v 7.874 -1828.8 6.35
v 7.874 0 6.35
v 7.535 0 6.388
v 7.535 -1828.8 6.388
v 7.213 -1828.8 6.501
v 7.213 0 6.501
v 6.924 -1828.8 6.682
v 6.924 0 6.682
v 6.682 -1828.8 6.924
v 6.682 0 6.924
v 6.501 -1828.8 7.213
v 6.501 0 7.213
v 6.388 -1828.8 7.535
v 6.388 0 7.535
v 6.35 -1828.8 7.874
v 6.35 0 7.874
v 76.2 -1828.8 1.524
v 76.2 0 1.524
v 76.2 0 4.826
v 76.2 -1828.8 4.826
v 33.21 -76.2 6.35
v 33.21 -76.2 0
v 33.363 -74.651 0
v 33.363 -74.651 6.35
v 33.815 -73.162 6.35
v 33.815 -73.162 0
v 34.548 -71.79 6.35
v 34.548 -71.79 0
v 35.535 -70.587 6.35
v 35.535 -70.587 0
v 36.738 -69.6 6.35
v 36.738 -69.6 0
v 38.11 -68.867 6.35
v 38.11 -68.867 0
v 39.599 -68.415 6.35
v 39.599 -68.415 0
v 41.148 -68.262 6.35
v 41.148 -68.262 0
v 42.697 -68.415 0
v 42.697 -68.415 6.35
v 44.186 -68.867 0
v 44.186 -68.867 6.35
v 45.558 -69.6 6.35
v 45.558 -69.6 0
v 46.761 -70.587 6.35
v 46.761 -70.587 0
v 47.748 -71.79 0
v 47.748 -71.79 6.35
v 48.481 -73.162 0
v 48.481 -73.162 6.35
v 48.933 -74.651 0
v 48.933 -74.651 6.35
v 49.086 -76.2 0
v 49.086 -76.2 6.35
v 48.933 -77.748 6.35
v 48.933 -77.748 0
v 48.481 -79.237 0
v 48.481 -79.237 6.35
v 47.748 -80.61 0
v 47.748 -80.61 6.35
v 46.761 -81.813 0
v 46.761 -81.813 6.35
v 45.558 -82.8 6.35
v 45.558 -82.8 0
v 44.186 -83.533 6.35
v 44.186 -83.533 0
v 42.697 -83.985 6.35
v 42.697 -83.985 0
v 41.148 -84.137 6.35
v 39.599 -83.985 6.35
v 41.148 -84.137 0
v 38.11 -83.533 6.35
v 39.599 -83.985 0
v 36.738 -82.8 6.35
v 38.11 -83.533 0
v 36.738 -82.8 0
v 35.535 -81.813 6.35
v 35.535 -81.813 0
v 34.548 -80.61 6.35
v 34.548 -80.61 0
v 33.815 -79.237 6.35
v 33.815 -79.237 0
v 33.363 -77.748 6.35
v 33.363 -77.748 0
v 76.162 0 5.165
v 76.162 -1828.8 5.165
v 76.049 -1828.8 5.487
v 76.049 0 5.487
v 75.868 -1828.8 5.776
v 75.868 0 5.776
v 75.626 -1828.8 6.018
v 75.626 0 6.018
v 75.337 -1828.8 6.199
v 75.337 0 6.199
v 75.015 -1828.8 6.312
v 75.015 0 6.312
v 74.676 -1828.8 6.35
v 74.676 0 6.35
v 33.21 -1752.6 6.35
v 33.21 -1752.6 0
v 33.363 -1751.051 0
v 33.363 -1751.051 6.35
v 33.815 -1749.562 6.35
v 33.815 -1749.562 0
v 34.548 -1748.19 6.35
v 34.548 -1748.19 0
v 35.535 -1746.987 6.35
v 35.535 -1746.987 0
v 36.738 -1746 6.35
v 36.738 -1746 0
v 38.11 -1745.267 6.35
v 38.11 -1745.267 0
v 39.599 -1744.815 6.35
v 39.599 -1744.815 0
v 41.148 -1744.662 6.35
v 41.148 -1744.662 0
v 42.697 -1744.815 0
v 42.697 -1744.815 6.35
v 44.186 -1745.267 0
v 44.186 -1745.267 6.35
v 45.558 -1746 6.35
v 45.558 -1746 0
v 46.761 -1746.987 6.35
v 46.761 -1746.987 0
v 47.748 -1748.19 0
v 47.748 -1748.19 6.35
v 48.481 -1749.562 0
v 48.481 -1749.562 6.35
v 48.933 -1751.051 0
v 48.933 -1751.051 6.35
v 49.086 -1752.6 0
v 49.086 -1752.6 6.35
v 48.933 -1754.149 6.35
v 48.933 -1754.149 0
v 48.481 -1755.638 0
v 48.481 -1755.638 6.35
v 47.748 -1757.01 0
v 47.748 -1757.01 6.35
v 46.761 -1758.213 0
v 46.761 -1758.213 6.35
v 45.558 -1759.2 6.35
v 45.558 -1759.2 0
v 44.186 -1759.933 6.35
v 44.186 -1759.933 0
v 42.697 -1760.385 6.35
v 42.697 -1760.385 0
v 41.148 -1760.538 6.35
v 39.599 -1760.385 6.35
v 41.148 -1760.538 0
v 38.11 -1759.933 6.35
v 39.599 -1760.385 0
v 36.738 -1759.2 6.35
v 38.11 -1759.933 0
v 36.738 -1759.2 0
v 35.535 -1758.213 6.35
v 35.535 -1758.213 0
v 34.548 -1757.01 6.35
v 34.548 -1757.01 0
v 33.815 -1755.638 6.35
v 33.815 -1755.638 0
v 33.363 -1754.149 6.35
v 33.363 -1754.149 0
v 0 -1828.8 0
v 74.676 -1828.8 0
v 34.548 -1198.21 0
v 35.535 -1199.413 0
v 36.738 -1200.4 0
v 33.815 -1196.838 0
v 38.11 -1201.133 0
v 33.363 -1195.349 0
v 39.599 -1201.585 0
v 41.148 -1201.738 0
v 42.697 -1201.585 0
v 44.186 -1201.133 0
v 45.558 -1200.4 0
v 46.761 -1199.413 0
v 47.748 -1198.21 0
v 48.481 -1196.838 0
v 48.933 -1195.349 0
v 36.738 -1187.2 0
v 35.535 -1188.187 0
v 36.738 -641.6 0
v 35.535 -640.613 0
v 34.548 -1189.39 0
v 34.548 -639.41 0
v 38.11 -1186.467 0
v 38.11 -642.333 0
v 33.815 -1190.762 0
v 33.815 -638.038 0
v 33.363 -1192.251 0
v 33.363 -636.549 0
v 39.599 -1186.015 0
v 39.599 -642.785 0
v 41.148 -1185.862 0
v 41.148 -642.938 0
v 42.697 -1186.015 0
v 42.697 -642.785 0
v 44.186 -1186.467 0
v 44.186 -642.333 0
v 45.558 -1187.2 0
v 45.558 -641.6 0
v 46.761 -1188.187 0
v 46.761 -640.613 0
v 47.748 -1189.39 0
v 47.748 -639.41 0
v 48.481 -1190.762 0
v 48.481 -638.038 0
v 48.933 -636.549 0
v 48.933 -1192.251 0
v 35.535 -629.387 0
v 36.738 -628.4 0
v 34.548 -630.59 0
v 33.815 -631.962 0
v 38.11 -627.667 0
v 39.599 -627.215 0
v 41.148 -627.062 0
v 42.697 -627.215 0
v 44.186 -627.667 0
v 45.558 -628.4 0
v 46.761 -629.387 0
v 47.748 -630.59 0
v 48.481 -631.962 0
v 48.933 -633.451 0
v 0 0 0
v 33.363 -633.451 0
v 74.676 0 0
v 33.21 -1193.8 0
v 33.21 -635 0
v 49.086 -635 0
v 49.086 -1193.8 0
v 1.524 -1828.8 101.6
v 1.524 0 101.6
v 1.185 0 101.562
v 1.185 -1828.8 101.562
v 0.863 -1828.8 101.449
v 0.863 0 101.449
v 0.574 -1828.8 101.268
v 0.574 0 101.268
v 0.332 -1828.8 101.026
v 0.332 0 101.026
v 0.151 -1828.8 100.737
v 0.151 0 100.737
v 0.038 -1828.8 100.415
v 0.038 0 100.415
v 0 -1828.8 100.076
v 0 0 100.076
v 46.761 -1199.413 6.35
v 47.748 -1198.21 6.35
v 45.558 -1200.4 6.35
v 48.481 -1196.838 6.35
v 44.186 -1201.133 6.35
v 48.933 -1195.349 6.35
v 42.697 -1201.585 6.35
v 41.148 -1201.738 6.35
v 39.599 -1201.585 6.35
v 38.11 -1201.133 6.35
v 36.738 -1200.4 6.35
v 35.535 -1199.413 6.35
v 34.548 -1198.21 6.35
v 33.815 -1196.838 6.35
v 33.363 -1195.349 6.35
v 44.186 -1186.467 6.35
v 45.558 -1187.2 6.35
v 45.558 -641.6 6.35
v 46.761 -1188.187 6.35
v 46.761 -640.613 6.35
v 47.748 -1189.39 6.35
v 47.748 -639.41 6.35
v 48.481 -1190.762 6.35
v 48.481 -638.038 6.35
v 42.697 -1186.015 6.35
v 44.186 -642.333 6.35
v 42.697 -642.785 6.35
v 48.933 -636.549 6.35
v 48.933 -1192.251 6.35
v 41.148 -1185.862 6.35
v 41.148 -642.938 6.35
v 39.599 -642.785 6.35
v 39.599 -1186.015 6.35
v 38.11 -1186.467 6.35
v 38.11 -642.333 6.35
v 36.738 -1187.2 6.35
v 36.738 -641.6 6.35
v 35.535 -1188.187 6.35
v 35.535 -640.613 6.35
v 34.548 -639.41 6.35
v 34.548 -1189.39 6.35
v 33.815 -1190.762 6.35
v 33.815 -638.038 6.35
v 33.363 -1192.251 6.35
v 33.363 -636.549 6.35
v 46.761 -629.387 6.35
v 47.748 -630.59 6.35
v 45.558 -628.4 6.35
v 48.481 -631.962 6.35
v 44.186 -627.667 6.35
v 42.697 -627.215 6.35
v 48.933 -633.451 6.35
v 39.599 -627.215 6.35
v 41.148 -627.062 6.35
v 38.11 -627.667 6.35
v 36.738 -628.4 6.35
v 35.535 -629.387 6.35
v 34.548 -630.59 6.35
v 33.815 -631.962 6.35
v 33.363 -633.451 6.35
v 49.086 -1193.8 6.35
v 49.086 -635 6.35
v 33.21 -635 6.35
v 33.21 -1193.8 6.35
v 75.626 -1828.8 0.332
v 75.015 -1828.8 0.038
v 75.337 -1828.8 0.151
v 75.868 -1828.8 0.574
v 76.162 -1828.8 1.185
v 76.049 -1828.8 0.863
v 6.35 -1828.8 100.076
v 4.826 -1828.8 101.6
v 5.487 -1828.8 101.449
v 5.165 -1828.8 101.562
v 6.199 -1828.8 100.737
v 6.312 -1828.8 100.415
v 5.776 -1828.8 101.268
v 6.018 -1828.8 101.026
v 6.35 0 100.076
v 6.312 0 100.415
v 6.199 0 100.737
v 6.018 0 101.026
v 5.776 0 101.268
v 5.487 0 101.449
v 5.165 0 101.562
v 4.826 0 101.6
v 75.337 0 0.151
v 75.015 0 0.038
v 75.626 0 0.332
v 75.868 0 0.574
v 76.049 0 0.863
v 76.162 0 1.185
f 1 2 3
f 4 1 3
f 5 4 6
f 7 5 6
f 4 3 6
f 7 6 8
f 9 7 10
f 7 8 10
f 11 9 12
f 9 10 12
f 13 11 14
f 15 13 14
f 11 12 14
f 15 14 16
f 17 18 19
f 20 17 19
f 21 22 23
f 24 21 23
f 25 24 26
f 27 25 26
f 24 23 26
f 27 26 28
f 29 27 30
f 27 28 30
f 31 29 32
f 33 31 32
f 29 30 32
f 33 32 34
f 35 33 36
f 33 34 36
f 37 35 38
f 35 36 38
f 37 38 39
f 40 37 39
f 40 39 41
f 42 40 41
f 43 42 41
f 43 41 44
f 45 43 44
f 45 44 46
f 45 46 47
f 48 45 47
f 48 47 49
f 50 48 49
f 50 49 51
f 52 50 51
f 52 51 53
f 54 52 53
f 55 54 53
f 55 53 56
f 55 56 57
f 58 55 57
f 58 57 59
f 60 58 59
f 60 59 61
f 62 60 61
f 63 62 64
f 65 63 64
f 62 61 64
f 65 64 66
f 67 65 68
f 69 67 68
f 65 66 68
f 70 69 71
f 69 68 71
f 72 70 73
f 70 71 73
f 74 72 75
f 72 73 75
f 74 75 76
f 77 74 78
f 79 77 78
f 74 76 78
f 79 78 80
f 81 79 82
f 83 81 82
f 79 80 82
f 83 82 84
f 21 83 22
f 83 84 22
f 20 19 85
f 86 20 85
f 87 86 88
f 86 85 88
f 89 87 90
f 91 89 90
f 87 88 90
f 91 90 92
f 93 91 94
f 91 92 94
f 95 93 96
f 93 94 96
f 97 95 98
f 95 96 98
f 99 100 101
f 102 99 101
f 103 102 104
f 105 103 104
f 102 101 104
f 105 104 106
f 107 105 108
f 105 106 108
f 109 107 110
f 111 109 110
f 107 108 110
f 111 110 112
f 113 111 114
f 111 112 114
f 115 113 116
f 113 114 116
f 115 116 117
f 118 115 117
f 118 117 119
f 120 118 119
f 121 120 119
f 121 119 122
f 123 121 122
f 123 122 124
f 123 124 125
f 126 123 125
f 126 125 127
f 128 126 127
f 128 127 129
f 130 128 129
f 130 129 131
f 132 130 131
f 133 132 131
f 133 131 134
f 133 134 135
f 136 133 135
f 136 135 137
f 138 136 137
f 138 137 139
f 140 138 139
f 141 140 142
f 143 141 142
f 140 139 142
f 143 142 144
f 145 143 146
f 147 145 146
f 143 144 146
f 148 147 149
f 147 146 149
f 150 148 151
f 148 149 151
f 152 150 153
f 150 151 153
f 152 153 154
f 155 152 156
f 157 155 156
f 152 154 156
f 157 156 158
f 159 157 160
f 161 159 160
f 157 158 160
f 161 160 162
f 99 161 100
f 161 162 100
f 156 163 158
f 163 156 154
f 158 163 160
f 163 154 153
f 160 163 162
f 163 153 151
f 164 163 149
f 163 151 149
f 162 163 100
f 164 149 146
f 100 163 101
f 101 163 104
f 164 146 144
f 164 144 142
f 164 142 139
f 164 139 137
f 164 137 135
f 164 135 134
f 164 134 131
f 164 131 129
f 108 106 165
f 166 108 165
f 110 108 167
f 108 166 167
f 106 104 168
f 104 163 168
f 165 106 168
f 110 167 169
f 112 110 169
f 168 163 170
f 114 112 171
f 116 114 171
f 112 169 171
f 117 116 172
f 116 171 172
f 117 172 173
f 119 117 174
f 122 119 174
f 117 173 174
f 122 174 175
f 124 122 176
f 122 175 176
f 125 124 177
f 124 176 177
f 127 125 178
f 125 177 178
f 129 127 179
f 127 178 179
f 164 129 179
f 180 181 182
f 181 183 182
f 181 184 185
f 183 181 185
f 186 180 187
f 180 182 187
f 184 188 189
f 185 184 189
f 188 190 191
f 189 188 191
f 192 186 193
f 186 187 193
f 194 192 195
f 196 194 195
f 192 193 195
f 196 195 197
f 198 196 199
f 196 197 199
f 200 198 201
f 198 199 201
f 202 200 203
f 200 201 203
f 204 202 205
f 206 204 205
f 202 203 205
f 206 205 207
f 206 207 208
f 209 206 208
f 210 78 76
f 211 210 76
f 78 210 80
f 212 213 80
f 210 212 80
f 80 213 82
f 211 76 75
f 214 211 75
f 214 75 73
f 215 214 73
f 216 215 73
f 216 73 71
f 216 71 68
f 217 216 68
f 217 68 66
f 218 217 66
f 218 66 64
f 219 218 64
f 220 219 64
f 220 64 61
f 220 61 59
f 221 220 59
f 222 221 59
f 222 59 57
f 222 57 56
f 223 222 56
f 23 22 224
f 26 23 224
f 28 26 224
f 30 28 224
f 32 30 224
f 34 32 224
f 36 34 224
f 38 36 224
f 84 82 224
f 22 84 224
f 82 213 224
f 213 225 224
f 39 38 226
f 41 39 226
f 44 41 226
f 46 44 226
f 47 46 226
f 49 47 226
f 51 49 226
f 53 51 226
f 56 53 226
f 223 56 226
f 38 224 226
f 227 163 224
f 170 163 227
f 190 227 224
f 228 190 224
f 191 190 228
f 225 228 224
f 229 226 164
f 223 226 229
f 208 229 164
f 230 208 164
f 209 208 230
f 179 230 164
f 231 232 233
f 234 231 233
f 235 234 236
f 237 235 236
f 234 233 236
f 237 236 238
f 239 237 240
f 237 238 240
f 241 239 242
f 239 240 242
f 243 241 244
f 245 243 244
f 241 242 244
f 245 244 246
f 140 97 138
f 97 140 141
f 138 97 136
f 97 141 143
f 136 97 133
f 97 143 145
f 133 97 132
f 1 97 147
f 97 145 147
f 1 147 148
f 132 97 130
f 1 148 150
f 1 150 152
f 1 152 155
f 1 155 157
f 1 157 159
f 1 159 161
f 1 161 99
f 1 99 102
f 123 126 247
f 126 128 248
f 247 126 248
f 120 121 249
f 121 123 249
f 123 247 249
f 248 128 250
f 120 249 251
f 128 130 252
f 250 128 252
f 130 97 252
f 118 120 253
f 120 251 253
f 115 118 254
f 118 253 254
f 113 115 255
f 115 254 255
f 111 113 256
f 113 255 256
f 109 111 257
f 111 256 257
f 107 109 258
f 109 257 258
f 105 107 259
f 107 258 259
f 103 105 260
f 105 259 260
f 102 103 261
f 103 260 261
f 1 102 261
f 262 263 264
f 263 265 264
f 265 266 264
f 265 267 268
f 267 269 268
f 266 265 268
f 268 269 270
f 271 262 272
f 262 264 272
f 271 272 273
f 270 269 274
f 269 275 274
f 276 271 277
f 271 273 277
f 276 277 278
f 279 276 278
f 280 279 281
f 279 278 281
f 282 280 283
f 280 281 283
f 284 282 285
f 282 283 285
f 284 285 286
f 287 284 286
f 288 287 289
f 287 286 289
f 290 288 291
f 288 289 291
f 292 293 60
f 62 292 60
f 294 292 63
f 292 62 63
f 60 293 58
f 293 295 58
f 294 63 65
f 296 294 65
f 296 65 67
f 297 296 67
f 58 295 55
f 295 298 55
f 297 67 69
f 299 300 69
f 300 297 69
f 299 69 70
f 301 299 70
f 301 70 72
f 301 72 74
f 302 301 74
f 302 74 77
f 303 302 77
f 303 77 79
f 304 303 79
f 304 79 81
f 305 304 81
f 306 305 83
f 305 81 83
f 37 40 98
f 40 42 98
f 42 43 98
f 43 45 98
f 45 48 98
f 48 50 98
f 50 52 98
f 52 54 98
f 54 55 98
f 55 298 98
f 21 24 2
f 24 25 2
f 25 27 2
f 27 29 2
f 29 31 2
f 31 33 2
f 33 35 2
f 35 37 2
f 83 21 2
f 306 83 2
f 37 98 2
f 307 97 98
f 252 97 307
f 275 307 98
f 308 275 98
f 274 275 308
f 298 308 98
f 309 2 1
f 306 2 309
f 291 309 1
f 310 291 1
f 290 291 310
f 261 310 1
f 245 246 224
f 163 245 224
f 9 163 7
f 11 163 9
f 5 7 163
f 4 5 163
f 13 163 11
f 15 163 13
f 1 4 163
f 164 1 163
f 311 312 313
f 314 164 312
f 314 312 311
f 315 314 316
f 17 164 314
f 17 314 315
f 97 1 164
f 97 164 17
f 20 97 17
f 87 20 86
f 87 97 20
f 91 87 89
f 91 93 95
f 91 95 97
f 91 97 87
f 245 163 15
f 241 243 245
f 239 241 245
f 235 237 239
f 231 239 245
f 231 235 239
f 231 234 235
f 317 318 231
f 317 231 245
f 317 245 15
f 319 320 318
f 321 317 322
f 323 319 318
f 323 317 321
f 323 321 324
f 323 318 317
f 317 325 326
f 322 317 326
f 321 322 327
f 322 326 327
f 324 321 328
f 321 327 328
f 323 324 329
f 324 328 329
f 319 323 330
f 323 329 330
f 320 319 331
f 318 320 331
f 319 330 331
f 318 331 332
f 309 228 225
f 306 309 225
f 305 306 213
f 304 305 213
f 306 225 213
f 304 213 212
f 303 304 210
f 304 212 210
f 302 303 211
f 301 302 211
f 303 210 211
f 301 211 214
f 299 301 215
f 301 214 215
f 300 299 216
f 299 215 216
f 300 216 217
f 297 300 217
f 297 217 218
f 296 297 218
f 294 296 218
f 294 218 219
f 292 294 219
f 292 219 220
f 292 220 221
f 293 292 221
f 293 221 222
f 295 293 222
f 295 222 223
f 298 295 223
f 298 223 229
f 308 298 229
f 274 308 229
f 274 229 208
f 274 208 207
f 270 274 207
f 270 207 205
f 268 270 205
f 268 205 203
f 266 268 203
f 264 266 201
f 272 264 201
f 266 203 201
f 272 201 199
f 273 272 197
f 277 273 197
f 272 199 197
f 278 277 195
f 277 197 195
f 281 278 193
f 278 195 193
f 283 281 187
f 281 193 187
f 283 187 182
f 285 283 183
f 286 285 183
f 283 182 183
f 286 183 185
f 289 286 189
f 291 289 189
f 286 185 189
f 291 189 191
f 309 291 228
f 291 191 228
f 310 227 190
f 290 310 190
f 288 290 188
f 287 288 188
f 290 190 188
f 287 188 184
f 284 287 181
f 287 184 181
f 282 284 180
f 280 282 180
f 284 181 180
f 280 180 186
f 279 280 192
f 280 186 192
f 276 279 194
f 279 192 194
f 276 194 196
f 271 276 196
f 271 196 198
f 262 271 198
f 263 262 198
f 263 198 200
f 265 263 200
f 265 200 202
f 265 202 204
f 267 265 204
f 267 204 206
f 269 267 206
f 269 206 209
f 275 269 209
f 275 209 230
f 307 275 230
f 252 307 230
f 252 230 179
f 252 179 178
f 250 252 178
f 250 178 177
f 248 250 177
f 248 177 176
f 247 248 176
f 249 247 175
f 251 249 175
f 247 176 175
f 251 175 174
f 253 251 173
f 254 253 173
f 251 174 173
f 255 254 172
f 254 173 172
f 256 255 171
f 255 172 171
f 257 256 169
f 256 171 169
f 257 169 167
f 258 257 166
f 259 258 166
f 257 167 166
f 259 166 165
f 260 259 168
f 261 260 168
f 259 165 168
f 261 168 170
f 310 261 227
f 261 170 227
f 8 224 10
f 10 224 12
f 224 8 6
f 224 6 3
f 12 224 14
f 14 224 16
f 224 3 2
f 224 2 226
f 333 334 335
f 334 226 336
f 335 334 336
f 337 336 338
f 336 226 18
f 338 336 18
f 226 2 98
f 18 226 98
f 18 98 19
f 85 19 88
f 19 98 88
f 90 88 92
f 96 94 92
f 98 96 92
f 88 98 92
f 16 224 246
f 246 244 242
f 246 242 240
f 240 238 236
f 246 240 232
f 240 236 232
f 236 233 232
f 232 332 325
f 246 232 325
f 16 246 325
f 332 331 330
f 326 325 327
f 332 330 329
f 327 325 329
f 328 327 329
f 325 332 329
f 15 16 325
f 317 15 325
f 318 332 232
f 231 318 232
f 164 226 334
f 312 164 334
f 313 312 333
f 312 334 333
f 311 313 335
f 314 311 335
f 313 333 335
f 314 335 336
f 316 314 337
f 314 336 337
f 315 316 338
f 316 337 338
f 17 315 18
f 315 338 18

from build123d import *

# Parameters (mm, degrees)
F1_DEPTH = 1828.8
F3_D     = 15.875


with BuildPart() as f1:
    # F0 (on Front) → F1 (new body)
    with BuildSketch(Plane.XZ):
        with BuildLine():
            Line((0, 100.076), (0, 0))
            Line((0, 0), (74.676, 0))
            ThreePointArc((74.676, 0), (75.753631, 0.446369), (76.2, 1.524))
            Line((76.2, 1.524), (76.2, 4.826))
            ThreePointArc((76.2, 4.826), (75.753631, 5.903631), (74.676, 6.35))
            Line((74.676, 6.35), (7.874, 6.35))
            ThreePointArc((7.874, 6.35), (6.796369, 6.796369), (6.35, 7.874))
            Line((6.35, 7.874), (6.35, 100.076))
            ThreePointArc((6.35, 100.076), (5.903631, 101.153631), (4.826, 101.6))
            Line((4.826, 101.6), (1.524, 101.6))
            ThreePointArc((1.524, 101.6), (0.446369, 101.153631), (0, 100.076))
        make_face()
    extrude(amount=F1_DEPTH)

    # F3 (through all)
    with Locations(Plane.XY.offset(6.35)):
        with Locations((41.148, -1752.6), (41.148, -1193.8), (41.148, -635), (41.148, -76.199894)):
            Hole(F3_D / 2)


solid = f1.part
